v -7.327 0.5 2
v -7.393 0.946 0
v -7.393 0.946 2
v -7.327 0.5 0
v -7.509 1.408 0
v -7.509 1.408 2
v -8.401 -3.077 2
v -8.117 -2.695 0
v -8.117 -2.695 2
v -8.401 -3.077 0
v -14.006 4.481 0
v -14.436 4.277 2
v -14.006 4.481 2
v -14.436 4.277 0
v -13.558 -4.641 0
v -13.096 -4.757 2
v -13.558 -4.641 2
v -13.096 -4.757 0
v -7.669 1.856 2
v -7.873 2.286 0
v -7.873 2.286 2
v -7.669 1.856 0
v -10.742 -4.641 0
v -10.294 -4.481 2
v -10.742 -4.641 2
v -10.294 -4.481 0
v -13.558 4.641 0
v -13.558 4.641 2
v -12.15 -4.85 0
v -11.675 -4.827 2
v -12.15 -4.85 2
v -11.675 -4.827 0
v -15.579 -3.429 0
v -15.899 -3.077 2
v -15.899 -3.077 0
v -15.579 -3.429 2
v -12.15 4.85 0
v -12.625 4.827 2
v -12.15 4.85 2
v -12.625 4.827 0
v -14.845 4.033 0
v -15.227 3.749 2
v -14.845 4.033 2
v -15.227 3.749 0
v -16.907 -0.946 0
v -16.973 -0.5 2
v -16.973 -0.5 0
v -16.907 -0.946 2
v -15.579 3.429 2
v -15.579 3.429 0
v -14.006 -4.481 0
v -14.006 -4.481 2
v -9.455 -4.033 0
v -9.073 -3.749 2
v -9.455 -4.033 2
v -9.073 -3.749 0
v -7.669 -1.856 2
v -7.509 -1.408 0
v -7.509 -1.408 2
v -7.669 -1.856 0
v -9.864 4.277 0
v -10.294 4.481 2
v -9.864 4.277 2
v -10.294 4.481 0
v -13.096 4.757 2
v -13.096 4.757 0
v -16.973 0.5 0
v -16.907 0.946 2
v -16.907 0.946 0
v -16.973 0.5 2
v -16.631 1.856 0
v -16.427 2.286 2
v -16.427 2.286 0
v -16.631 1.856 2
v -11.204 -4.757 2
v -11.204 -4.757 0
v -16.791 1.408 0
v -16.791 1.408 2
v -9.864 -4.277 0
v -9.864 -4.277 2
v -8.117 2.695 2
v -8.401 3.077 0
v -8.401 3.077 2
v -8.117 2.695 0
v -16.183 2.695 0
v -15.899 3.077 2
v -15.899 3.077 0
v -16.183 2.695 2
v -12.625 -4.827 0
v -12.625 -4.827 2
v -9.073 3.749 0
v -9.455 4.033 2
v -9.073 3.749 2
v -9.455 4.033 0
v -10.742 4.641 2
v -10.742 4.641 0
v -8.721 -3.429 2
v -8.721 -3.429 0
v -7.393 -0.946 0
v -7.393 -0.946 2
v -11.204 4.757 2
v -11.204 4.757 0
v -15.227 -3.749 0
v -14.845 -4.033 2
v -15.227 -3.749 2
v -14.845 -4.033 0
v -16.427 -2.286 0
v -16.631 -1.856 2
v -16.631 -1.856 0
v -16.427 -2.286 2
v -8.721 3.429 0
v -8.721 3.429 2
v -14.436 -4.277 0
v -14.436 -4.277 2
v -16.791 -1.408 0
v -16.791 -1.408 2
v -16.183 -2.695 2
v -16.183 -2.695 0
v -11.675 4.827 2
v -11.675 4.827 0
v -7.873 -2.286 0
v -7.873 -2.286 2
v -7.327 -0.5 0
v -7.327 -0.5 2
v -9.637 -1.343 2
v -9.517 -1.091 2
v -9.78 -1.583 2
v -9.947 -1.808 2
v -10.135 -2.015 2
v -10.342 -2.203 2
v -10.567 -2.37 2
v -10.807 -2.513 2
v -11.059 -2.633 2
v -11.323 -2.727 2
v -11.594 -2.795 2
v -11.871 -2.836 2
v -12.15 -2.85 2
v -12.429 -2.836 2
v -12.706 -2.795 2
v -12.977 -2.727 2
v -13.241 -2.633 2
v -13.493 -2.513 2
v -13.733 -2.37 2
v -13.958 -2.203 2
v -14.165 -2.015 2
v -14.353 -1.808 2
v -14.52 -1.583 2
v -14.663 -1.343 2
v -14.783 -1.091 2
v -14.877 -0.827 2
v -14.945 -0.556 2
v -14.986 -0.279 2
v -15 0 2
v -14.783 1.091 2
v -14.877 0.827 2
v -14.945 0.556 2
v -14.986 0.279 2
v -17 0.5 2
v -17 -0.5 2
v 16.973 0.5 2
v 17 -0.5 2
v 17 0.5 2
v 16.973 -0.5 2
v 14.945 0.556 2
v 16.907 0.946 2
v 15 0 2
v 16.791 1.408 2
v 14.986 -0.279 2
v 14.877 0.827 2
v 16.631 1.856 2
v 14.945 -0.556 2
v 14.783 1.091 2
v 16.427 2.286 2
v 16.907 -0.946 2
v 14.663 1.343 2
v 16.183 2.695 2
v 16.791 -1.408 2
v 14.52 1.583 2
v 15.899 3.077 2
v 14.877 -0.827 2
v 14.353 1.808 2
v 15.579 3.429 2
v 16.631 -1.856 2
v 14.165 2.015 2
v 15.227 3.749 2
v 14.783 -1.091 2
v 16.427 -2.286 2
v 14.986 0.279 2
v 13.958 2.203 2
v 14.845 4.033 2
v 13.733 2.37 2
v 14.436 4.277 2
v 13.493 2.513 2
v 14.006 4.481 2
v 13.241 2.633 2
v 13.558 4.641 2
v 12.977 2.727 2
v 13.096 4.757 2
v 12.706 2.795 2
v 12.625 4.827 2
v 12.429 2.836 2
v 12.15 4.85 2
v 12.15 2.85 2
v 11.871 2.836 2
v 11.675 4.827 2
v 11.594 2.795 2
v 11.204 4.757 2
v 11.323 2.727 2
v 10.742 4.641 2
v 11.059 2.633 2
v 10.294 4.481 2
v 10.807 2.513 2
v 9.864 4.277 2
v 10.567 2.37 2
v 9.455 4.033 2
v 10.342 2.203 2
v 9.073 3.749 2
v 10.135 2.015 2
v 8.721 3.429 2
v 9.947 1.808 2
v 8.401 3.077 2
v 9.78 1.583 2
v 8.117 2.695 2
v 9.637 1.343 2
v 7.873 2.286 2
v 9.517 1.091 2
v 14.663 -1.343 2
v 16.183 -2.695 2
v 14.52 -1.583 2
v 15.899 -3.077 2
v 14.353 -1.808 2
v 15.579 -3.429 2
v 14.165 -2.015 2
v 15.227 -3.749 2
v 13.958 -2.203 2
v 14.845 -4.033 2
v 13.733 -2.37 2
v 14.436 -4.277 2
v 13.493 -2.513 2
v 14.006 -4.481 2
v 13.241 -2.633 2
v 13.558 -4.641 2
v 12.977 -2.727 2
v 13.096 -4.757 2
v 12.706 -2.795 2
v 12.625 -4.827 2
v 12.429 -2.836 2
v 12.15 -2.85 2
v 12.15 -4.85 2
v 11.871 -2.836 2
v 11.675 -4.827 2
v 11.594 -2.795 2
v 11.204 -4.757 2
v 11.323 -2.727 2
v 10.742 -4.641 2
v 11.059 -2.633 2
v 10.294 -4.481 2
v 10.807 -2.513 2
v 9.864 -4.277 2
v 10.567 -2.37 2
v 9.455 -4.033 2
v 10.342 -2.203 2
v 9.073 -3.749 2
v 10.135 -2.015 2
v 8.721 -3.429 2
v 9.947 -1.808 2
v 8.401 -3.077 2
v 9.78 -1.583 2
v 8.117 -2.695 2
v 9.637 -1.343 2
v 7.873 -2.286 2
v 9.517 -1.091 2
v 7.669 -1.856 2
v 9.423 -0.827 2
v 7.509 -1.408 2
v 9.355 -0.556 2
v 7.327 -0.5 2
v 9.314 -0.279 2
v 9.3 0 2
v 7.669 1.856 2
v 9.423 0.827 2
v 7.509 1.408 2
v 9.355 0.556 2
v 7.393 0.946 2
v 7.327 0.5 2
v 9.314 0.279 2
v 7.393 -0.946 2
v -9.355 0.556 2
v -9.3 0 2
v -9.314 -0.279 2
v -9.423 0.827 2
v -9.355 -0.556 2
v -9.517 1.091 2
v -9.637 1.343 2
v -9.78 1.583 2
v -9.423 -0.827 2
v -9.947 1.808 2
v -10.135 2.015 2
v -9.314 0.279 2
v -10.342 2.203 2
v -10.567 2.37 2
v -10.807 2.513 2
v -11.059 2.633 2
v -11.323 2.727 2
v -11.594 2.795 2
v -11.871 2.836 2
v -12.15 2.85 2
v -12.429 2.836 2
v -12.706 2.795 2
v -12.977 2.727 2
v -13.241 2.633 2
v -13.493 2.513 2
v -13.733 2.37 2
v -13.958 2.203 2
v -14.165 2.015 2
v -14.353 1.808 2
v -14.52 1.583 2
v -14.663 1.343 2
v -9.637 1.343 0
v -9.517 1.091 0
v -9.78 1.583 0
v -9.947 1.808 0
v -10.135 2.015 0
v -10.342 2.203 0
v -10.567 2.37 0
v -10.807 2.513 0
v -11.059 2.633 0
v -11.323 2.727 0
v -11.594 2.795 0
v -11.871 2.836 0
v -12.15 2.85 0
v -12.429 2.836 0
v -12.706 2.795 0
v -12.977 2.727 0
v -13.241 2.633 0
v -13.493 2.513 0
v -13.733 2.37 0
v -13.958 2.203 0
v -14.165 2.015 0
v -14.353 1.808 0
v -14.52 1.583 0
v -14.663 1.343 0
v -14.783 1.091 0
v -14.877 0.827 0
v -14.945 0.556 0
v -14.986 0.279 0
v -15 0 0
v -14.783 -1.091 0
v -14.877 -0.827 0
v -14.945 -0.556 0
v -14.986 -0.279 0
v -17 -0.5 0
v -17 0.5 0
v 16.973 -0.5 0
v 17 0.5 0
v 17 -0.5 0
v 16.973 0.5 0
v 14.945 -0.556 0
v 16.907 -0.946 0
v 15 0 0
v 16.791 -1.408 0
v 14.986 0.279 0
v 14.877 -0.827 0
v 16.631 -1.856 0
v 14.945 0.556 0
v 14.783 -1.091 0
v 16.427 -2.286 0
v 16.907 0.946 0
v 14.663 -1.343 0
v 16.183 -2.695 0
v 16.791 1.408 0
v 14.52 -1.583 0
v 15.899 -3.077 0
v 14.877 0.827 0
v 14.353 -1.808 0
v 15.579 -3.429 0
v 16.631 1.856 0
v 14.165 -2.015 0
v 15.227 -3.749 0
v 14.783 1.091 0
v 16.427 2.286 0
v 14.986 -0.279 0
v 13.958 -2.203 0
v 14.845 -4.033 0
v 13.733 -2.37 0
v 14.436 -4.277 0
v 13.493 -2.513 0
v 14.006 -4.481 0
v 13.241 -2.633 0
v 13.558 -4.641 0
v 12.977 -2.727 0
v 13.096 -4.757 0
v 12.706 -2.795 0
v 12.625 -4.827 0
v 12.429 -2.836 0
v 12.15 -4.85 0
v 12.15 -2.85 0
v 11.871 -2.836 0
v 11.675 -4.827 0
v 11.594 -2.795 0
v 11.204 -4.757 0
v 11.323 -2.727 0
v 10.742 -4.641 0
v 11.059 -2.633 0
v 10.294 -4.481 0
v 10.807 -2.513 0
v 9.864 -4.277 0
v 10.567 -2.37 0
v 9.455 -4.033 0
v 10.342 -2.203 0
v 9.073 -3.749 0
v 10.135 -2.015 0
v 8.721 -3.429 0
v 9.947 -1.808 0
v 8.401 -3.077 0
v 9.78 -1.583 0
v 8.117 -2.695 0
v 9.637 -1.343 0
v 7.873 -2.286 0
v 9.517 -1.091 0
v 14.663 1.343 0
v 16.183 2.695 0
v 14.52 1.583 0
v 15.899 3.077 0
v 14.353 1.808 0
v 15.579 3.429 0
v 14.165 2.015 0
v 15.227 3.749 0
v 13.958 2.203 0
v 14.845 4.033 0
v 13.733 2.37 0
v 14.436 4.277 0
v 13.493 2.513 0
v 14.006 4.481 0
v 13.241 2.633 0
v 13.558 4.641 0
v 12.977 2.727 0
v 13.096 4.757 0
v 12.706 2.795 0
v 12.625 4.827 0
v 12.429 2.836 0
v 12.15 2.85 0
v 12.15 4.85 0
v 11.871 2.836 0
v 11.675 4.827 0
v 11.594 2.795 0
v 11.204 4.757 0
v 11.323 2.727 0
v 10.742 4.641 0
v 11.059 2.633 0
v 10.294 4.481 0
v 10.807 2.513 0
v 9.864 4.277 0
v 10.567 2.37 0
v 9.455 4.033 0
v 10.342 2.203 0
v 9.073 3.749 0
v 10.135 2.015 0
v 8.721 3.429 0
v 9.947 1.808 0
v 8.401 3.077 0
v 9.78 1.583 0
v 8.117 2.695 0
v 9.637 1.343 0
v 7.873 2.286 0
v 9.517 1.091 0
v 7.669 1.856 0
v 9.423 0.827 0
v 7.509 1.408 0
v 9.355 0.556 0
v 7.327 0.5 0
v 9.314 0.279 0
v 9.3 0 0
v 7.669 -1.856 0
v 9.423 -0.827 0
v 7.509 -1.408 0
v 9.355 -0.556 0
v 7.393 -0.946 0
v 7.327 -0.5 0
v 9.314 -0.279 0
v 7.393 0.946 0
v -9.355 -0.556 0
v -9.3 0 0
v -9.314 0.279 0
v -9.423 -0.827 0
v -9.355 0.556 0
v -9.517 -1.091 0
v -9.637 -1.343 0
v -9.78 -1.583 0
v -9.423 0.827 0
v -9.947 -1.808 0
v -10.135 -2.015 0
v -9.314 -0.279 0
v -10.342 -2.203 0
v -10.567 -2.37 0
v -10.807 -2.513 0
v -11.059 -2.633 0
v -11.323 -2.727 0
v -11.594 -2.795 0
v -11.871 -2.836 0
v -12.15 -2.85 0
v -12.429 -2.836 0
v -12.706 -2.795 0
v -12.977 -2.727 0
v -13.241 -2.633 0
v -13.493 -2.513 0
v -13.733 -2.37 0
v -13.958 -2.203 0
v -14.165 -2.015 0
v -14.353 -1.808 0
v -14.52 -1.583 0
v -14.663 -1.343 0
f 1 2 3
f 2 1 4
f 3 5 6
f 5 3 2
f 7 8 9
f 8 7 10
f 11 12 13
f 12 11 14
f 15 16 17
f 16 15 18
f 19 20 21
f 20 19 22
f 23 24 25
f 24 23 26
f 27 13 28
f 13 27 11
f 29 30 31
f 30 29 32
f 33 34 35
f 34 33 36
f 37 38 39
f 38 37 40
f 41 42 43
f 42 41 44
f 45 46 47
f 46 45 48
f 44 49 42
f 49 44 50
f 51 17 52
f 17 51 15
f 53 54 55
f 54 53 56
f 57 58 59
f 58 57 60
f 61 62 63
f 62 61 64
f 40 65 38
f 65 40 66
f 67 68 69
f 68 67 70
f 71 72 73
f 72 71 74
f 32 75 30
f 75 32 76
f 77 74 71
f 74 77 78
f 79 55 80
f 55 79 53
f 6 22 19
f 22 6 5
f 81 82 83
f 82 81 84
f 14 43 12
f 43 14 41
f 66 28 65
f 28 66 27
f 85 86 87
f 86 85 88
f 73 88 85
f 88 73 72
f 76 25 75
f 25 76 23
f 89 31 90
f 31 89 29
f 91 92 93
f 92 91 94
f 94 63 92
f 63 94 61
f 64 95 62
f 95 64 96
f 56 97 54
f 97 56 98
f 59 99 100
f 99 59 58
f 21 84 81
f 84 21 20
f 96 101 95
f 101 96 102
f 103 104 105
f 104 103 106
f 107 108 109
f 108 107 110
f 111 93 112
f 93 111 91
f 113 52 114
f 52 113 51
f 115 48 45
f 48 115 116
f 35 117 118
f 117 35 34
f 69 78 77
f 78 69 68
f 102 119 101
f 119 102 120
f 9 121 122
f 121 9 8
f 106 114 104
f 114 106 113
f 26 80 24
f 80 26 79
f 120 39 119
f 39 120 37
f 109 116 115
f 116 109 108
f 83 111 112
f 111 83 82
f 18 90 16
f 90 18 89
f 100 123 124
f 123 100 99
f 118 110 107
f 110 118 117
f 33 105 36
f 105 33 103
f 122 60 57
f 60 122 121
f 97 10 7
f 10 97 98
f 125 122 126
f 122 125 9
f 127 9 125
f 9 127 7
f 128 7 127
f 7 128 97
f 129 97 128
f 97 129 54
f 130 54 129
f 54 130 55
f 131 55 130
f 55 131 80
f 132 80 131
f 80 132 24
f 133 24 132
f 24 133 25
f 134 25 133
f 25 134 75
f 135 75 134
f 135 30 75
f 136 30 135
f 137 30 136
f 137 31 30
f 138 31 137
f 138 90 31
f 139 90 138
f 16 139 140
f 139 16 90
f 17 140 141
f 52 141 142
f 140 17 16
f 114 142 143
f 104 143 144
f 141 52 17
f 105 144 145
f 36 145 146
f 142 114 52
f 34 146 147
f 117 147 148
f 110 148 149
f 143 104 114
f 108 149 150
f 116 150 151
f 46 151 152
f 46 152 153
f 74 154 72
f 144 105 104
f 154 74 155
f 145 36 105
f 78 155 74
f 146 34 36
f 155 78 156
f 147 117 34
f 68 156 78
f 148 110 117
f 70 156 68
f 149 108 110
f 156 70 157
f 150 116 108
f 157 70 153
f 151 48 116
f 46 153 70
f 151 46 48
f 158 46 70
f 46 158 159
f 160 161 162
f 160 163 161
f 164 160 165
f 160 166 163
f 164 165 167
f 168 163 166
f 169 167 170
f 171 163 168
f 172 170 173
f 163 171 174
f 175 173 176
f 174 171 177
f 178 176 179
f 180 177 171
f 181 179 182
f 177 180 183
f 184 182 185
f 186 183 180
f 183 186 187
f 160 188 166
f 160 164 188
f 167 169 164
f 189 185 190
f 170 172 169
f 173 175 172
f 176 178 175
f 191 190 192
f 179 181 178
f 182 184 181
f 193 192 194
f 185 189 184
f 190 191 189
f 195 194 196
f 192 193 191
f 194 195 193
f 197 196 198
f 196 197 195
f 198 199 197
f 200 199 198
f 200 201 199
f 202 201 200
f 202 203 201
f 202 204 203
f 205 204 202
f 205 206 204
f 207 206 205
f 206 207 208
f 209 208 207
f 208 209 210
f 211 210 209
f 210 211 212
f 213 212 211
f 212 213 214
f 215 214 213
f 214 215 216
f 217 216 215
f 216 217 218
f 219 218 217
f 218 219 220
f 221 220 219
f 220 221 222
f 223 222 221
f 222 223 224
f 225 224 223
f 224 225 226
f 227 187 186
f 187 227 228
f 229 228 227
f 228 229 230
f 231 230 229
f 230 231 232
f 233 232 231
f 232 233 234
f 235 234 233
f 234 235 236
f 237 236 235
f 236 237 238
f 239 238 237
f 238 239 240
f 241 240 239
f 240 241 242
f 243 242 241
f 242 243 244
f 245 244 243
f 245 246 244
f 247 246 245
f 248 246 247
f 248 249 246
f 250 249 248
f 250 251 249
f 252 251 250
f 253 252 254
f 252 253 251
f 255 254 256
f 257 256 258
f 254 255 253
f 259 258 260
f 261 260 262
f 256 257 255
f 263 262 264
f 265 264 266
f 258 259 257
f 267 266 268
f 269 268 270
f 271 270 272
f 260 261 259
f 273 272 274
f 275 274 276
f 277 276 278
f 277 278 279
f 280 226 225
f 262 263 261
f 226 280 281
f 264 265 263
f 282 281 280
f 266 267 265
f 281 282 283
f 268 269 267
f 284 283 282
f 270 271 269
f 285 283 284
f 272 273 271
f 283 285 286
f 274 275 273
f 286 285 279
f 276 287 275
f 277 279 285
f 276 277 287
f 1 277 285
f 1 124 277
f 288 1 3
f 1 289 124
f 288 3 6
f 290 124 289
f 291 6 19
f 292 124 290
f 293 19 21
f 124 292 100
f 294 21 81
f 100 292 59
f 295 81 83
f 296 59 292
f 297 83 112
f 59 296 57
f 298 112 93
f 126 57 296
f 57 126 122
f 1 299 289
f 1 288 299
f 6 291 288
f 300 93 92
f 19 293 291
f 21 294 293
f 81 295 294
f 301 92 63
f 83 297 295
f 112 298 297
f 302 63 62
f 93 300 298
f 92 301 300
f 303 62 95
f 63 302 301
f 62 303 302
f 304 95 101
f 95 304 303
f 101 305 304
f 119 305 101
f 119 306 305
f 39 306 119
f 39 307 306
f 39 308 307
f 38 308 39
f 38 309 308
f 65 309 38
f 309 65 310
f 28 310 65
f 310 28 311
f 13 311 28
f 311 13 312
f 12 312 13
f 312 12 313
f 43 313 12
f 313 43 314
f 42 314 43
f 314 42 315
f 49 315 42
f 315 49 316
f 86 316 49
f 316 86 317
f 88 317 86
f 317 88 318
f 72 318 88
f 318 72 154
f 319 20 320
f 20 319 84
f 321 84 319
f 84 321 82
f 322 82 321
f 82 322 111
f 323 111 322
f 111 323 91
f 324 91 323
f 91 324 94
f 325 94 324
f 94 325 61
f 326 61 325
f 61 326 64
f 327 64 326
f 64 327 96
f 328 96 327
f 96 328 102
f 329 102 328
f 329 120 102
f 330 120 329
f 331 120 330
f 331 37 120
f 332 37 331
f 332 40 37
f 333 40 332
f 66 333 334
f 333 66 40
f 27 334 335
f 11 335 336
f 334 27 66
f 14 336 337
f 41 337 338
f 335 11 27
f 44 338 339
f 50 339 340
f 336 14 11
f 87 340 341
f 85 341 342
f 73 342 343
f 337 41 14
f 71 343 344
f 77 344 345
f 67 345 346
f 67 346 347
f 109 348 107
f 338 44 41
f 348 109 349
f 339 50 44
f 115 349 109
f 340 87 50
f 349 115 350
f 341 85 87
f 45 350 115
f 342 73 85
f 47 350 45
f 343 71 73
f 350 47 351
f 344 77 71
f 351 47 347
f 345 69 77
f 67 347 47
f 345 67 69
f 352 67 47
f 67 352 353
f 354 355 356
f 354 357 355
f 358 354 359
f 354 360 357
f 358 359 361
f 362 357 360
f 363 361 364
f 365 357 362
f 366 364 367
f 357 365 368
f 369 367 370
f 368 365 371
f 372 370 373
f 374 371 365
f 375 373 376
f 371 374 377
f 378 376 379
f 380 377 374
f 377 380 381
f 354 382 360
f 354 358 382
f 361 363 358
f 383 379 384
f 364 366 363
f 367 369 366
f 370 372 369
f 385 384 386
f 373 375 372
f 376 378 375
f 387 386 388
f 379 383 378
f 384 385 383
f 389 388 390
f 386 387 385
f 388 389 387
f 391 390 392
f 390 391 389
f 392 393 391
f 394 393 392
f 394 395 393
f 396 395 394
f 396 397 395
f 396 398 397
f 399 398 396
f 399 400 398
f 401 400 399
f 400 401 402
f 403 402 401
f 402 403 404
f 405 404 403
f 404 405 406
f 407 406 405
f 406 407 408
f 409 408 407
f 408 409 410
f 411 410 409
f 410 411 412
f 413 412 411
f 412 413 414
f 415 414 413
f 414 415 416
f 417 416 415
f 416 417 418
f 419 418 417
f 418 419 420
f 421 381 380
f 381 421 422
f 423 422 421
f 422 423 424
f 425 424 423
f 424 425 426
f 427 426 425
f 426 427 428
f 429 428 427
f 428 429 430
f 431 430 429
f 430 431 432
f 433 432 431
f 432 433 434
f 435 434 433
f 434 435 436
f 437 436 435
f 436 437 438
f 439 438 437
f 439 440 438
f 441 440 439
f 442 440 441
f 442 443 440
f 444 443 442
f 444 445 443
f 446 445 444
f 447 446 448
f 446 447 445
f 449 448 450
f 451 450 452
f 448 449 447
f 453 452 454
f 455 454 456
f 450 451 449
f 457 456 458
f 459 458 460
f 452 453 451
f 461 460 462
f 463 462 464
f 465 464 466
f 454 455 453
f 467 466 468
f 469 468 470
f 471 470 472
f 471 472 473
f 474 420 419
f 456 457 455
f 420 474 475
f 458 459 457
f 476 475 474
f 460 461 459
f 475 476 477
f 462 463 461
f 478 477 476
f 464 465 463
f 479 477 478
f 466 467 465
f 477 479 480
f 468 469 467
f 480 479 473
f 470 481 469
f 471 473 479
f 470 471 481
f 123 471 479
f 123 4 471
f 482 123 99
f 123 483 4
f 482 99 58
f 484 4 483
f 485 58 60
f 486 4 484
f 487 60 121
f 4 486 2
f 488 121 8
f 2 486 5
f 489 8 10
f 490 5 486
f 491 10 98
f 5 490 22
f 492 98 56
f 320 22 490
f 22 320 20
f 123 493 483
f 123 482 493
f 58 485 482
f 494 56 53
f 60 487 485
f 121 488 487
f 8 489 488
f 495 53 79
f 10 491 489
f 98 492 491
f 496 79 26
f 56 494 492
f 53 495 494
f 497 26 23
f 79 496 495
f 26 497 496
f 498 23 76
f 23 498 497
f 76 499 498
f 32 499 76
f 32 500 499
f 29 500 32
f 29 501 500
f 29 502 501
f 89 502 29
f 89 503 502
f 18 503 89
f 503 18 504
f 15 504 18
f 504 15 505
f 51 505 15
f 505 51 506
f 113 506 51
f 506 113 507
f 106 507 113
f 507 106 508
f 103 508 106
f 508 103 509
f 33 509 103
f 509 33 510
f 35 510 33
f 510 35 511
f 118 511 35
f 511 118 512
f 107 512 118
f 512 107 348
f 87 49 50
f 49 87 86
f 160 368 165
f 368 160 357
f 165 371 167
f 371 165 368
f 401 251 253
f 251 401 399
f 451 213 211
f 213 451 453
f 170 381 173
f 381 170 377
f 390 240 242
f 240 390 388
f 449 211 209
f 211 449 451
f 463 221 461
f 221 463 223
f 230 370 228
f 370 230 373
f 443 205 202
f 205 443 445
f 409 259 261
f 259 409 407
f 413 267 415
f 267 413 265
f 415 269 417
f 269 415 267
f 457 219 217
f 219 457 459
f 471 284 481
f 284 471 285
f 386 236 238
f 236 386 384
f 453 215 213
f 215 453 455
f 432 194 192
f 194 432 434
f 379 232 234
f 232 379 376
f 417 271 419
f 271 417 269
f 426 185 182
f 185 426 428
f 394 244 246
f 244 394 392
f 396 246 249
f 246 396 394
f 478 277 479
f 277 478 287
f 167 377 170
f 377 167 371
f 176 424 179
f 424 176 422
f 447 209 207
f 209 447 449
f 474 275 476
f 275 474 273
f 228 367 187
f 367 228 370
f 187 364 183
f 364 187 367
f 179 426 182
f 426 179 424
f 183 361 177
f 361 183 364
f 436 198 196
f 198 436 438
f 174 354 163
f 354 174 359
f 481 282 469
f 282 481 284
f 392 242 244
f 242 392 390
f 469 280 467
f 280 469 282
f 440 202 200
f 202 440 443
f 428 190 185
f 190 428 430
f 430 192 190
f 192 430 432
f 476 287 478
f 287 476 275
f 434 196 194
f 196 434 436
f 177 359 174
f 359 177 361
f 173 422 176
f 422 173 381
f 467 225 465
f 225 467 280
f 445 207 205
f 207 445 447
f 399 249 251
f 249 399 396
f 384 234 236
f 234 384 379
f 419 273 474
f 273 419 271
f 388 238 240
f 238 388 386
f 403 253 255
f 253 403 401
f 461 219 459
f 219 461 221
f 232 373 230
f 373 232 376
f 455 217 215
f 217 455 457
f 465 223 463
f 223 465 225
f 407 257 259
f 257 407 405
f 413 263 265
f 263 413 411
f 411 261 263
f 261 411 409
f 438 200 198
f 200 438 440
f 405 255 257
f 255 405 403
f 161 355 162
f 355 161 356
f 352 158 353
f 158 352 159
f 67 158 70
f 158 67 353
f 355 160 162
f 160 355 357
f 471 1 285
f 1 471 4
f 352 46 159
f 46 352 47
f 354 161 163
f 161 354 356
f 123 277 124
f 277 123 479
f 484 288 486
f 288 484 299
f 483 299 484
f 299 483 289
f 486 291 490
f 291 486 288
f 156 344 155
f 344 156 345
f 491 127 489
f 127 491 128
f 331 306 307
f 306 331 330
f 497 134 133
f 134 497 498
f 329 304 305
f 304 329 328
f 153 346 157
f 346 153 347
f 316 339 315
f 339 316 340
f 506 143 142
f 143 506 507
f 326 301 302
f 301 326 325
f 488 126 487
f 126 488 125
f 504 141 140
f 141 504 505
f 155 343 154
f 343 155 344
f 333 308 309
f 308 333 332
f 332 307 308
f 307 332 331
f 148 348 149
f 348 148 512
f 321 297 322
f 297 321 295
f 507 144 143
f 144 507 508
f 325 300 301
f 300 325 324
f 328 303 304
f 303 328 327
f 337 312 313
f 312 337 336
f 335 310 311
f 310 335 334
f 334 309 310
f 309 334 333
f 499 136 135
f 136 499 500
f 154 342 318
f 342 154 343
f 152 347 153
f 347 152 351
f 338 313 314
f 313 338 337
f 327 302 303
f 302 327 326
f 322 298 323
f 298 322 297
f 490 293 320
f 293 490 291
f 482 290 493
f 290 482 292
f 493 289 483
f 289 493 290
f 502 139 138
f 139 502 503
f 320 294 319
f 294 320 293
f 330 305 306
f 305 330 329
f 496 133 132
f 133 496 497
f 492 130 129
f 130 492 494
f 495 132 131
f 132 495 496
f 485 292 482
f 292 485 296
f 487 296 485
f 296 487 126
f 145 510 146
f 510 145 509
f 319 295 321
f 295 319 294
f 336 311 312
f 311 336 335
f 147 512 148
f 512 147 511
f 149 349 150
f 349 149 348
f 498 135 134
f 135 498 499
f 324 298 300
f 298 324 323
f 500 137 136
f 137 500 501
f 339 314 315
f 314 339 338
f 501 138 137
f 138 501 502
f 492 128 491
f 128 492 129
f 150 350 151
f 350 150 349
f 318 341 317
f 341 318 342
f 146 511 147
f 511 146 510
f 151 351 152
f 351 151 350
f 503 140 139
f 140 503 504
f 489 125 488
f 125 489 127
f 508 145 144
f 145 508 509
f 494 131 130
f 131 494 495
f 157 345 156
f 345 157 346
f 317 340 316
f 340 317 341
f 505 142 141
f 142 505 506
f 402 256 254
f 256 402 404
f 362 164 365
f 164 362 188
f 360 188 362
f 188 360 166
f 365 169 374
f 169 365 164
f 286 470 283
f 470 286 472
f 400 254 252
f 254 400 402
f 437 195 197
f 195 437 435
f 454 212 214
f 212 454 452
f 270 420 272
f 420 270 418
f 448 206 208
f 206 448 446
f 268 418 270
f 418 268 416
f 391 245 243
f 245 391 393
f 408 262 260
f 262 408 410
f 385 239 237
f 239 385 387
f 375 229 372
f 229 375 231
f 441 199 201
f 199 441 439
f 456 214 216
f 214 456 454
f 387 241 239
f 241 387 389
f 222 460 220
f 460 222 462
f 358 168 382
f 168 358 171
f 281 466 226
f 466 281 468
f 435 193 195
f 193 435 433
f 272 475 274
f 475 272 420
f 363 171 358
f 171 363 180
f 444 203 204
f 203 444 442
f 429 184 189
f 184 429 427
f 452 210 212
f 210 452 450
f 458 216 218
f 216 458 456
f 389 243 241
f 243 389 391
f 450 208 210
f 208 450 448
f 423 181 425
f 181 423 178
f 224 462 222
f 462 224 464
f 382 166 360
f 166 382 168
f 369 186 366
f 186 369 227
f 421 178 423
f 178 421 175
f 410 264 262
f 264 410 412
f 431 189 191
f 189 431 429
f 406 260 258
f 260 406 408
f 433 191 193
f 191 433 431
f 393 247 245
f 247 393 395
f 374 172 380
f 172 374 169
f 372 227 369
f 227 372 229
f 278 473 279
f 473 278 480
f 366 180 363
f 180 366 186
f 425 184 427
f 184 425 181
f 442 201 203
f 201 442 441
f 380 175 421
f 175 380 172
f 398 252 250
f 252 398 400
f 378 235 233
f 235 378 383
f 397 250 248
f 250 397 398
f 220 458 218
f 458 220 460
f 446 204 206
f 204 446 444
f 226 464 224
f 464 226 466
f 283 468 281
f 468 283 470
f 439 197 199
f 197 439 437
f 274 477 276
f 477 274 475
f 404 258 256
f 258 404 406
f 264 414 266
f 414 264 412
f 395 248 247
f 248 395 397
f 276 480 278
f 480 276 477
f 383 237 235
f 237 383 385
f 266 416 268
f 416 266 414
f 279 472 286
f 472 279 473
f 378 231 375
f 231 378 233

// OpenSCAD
/* [MOUNT] */
WIDTH = 30;
MOUNT_DIAMETER = 5.7;
MOUNT_THICKNESS = 4;
MOUNT_HEIGHT= 6.75;     // 6.75

/* [BRIDGE] */
BRIDGE_WIDTH = WIDTH;
MIN_BRIDGE_WIDTH = WIDTH/2;
BRIDGE_HEIGHT = 14;  // MOUNT_HEIGHT
BRIDGE_ANGLE = 45;
BRIDGE_X_OFFSET = 12;
BRIDGE_Z_OFFSET = 5;
BRIDGE_THICKNESS = 1;

/* [SMA] */
SMA_HOLE_OFFSET = 0;
SMA_HOLE_DIAMETER = 5.95;
SMA_OUTLINER_DIAMETER = 9.09;
SMA_CUTOUT_WIDTH = WIDTH - 4*MOUNT_THICKNESS;
SMA_CUTOUT_HEIGHT = 12;

/* [META] */
TEST_WIDTH = true;     // [false, true]
HULL_TYPE = 2;          // [0,1,2]
CORNERS_DIAMETER = 4;   // [16:0.5:40]
BOUNDED = false;        // [true, false]
FN = 64;                // [0:32:256]  

/* [HIDDEN] */
$fn = FN;
DEBUG = false;

sma_holder();

module sma_holder(){
    difference(){
        if(TEST_WIDTH){
            union(){
                side_mounts(2);       
                vertical_bridge(2);                     
            }
        }
        else{
            if(HULL_TYPE==0){
                union(){
                    side_mounts(MOUNT_HEIGHT);
                    vertical_bridge(MOUNT_HEIGHT);                
                    bridge_with_mount();   
                }            
            }
            if(HULL_TYPE==1){            
                hull(){
                    side_mounts(MOUNT_HEIGHT);
                    vertical_bridge(MOUNT_HEIGHT);
                    bridge_with_mount();            
                }
            }
            if(HULL_TYPE==2){
                union(){
                    side_mounts(MOUNT_HEIGHT);
                    hull(){
                        vertical_bridge(MOUNT_HEIGHT);                
                        bridge_with_mount();                            
                    }
                }            
            }
        }      

        // Poles
        side_poles();
        
        
        // Holder cutouts
        translate([0,BRIDGE_X_OFFSET, BRIDGE_THICKNESS/2 + BRIDGE_Z_OFFSET])
        rotate([BRIDGE_ANGLE,0,0])       
        union(){
            translate([0,SMA_HOLE_OFFSET,0])
            sma_hole();
            
            translate([0,SMA_HOLE_OFFSET,0])
            sma_outliner();                 
            
            translate([0,0,0])            
            sma_plate();        
        }
        
        if(BOUNDED){
            // LOWER bound
            translate([0,0,-WIDTH/2])
            cube([WIDTH*2, WIDTH*2, WIDTH], true);
            
            // UPPER bound    
            translate([0,0,MOUNT_HEIGHT+WIDTH/2])
            cube([WIDTH*2, WIDTH*2, WIDTH], true);   
        }        
        
    }

    if(DEBUG){
        
        translate([0,BRIDGE_X_OFFSET, BRIDGE_THICKNESS/2 + BRIDGE_Z_OFFSET])
        rotate([BRIDGE_ANGLE,0,0])       
        union(){
            translate([0,SMA_HOLE_OFFSET,0])
            sma_hole();
            
            translate([0,SMA_HOLE_OFFSET,0])
            sma_outliner();                 
            
            translate([0,0,0])            
            sma_plate();        
        }       
        
    }
}

module side_mounts(height){
    x_offset = WIDTH/2 - MOUNT_DIAMETER/2;
    
    translate([-x_offset,0,0])    
    mount(height);

    translate([x_offset,0,0])
    mount(height);    
}

module mount(height){
    outside_diameter = MOUNT_DIAMETER + MOUNT_THICKNESS;    
    
    translate([0,0, height/2])
    cylinder(height, outside_diameter/2, outside_diameter/2, true);
}

module side_poles(){
    x_offset = WIDTH/2 - MOUNT_DIAMETER/2;
    
    translate([-x_offset,0,0])    
    pole();

    translate([x_offset,0,0])
    pole();       
}

module pole(){
    outside_diameter = MOUNT_DIAMETER + MOUNT_THICKNESS;    
    
    translate([0,0, MOUNT_HEIGHT/2])
    cylinder(MOUNT_HEIGHT*2, MOUNT_DIAMETER/2, MOUNT_DIAMETER/2, true);        
}

module vertical_bridge(height){
    translate([0,0, height/2])    
    cube([BRIDGE_WIDTH+MOUNT_THICKNESS, BRIDGE_THICKNESS, height], true);      
}

module bridge_with_mount(){
//    if(BRIDGE_X_OFFSET>0){
//        translate([0,0, BRIDGE_THICKNESS/2 + BRIDGE_Z_OFFSET])            
//        bridge(BRIDGE_WIDTH, BRIDGE_WIDTH, BRIDGE_X_OFFSET, BRIDGE_THICKNESS);    
//    }
    
    translate([0,BRIDGE_X_OFFSET, BRIDGE_THICKNESS/2 + BRIDGE_Z_OFFSET])
    rotate([BRIDGE_ANGLE,0,0])    
    bridge(BRIDGE_WIDTH, MIN_BRIDGE_WIDTH, BRIDGE_HEIGHT, BRIDGE_THICKNESS);  
}

module bridge(wider_width, min_width, height, thickness){
    rounded_corners_trapeze(wider_width, min_width, height, thickness, CORNERS_DIAMETER);
}

module sma_hole(){
    cylinder(BRIDGE_THICKNESS*10, SMA_HOLE_DIAMETER/2, SMA_HOLE_DIAMETER/2, true);            
}

module sma_outliner(){
    outliner_thickness = BRIDGE_THICKNESS*10;
    translate([0,0,outliner_thickness/2])
    cylinder(outliner_thickness, SMA_OUTLINER_DIAMETER/2, SMA_OUTLINER_DIAMETER/2, true);            
}

module sma_plate(){
    outliner_thickness = BRIDGE_THICKNESS*20;
    translate([0,0,outliner_thickness/2+BRIDGE_THICKNESS/2])
    cube([SMA_CUTOUT_WIDTH, SMA_CUTOUT_HEIGHT, outliner_thickness], true);            
}


module rounded_corners_trapeze(bottom_width, upper_width, height, depth, corner_curve){
    x_translate = bottom_width-corner_curve;
    y_translate = height-corner_curve;     
    
    x_translate2 = upper_width-corner_curve;
    
    
    hull(){
            translate([-x_translate/2, -y_translate/2, 0])
            cylinder(depth,corner_curve/2, corner_curve/2, true);    
            
            translate([-x_translate2/2, y_translate/2, 0])
            cylinder(depth,corner_curve/2, corner_curve/2, true);

            translate([x_translate2/2, y_translate/2, 0])
            cylinder(depth,corner_curve/2, corner_curve/2, true);        
            
            translate([x_translate/2, -y_translate/2, 0])
            cylinder(depth,corner_curve/2, corner_curve/2, true);        
    }        
}
